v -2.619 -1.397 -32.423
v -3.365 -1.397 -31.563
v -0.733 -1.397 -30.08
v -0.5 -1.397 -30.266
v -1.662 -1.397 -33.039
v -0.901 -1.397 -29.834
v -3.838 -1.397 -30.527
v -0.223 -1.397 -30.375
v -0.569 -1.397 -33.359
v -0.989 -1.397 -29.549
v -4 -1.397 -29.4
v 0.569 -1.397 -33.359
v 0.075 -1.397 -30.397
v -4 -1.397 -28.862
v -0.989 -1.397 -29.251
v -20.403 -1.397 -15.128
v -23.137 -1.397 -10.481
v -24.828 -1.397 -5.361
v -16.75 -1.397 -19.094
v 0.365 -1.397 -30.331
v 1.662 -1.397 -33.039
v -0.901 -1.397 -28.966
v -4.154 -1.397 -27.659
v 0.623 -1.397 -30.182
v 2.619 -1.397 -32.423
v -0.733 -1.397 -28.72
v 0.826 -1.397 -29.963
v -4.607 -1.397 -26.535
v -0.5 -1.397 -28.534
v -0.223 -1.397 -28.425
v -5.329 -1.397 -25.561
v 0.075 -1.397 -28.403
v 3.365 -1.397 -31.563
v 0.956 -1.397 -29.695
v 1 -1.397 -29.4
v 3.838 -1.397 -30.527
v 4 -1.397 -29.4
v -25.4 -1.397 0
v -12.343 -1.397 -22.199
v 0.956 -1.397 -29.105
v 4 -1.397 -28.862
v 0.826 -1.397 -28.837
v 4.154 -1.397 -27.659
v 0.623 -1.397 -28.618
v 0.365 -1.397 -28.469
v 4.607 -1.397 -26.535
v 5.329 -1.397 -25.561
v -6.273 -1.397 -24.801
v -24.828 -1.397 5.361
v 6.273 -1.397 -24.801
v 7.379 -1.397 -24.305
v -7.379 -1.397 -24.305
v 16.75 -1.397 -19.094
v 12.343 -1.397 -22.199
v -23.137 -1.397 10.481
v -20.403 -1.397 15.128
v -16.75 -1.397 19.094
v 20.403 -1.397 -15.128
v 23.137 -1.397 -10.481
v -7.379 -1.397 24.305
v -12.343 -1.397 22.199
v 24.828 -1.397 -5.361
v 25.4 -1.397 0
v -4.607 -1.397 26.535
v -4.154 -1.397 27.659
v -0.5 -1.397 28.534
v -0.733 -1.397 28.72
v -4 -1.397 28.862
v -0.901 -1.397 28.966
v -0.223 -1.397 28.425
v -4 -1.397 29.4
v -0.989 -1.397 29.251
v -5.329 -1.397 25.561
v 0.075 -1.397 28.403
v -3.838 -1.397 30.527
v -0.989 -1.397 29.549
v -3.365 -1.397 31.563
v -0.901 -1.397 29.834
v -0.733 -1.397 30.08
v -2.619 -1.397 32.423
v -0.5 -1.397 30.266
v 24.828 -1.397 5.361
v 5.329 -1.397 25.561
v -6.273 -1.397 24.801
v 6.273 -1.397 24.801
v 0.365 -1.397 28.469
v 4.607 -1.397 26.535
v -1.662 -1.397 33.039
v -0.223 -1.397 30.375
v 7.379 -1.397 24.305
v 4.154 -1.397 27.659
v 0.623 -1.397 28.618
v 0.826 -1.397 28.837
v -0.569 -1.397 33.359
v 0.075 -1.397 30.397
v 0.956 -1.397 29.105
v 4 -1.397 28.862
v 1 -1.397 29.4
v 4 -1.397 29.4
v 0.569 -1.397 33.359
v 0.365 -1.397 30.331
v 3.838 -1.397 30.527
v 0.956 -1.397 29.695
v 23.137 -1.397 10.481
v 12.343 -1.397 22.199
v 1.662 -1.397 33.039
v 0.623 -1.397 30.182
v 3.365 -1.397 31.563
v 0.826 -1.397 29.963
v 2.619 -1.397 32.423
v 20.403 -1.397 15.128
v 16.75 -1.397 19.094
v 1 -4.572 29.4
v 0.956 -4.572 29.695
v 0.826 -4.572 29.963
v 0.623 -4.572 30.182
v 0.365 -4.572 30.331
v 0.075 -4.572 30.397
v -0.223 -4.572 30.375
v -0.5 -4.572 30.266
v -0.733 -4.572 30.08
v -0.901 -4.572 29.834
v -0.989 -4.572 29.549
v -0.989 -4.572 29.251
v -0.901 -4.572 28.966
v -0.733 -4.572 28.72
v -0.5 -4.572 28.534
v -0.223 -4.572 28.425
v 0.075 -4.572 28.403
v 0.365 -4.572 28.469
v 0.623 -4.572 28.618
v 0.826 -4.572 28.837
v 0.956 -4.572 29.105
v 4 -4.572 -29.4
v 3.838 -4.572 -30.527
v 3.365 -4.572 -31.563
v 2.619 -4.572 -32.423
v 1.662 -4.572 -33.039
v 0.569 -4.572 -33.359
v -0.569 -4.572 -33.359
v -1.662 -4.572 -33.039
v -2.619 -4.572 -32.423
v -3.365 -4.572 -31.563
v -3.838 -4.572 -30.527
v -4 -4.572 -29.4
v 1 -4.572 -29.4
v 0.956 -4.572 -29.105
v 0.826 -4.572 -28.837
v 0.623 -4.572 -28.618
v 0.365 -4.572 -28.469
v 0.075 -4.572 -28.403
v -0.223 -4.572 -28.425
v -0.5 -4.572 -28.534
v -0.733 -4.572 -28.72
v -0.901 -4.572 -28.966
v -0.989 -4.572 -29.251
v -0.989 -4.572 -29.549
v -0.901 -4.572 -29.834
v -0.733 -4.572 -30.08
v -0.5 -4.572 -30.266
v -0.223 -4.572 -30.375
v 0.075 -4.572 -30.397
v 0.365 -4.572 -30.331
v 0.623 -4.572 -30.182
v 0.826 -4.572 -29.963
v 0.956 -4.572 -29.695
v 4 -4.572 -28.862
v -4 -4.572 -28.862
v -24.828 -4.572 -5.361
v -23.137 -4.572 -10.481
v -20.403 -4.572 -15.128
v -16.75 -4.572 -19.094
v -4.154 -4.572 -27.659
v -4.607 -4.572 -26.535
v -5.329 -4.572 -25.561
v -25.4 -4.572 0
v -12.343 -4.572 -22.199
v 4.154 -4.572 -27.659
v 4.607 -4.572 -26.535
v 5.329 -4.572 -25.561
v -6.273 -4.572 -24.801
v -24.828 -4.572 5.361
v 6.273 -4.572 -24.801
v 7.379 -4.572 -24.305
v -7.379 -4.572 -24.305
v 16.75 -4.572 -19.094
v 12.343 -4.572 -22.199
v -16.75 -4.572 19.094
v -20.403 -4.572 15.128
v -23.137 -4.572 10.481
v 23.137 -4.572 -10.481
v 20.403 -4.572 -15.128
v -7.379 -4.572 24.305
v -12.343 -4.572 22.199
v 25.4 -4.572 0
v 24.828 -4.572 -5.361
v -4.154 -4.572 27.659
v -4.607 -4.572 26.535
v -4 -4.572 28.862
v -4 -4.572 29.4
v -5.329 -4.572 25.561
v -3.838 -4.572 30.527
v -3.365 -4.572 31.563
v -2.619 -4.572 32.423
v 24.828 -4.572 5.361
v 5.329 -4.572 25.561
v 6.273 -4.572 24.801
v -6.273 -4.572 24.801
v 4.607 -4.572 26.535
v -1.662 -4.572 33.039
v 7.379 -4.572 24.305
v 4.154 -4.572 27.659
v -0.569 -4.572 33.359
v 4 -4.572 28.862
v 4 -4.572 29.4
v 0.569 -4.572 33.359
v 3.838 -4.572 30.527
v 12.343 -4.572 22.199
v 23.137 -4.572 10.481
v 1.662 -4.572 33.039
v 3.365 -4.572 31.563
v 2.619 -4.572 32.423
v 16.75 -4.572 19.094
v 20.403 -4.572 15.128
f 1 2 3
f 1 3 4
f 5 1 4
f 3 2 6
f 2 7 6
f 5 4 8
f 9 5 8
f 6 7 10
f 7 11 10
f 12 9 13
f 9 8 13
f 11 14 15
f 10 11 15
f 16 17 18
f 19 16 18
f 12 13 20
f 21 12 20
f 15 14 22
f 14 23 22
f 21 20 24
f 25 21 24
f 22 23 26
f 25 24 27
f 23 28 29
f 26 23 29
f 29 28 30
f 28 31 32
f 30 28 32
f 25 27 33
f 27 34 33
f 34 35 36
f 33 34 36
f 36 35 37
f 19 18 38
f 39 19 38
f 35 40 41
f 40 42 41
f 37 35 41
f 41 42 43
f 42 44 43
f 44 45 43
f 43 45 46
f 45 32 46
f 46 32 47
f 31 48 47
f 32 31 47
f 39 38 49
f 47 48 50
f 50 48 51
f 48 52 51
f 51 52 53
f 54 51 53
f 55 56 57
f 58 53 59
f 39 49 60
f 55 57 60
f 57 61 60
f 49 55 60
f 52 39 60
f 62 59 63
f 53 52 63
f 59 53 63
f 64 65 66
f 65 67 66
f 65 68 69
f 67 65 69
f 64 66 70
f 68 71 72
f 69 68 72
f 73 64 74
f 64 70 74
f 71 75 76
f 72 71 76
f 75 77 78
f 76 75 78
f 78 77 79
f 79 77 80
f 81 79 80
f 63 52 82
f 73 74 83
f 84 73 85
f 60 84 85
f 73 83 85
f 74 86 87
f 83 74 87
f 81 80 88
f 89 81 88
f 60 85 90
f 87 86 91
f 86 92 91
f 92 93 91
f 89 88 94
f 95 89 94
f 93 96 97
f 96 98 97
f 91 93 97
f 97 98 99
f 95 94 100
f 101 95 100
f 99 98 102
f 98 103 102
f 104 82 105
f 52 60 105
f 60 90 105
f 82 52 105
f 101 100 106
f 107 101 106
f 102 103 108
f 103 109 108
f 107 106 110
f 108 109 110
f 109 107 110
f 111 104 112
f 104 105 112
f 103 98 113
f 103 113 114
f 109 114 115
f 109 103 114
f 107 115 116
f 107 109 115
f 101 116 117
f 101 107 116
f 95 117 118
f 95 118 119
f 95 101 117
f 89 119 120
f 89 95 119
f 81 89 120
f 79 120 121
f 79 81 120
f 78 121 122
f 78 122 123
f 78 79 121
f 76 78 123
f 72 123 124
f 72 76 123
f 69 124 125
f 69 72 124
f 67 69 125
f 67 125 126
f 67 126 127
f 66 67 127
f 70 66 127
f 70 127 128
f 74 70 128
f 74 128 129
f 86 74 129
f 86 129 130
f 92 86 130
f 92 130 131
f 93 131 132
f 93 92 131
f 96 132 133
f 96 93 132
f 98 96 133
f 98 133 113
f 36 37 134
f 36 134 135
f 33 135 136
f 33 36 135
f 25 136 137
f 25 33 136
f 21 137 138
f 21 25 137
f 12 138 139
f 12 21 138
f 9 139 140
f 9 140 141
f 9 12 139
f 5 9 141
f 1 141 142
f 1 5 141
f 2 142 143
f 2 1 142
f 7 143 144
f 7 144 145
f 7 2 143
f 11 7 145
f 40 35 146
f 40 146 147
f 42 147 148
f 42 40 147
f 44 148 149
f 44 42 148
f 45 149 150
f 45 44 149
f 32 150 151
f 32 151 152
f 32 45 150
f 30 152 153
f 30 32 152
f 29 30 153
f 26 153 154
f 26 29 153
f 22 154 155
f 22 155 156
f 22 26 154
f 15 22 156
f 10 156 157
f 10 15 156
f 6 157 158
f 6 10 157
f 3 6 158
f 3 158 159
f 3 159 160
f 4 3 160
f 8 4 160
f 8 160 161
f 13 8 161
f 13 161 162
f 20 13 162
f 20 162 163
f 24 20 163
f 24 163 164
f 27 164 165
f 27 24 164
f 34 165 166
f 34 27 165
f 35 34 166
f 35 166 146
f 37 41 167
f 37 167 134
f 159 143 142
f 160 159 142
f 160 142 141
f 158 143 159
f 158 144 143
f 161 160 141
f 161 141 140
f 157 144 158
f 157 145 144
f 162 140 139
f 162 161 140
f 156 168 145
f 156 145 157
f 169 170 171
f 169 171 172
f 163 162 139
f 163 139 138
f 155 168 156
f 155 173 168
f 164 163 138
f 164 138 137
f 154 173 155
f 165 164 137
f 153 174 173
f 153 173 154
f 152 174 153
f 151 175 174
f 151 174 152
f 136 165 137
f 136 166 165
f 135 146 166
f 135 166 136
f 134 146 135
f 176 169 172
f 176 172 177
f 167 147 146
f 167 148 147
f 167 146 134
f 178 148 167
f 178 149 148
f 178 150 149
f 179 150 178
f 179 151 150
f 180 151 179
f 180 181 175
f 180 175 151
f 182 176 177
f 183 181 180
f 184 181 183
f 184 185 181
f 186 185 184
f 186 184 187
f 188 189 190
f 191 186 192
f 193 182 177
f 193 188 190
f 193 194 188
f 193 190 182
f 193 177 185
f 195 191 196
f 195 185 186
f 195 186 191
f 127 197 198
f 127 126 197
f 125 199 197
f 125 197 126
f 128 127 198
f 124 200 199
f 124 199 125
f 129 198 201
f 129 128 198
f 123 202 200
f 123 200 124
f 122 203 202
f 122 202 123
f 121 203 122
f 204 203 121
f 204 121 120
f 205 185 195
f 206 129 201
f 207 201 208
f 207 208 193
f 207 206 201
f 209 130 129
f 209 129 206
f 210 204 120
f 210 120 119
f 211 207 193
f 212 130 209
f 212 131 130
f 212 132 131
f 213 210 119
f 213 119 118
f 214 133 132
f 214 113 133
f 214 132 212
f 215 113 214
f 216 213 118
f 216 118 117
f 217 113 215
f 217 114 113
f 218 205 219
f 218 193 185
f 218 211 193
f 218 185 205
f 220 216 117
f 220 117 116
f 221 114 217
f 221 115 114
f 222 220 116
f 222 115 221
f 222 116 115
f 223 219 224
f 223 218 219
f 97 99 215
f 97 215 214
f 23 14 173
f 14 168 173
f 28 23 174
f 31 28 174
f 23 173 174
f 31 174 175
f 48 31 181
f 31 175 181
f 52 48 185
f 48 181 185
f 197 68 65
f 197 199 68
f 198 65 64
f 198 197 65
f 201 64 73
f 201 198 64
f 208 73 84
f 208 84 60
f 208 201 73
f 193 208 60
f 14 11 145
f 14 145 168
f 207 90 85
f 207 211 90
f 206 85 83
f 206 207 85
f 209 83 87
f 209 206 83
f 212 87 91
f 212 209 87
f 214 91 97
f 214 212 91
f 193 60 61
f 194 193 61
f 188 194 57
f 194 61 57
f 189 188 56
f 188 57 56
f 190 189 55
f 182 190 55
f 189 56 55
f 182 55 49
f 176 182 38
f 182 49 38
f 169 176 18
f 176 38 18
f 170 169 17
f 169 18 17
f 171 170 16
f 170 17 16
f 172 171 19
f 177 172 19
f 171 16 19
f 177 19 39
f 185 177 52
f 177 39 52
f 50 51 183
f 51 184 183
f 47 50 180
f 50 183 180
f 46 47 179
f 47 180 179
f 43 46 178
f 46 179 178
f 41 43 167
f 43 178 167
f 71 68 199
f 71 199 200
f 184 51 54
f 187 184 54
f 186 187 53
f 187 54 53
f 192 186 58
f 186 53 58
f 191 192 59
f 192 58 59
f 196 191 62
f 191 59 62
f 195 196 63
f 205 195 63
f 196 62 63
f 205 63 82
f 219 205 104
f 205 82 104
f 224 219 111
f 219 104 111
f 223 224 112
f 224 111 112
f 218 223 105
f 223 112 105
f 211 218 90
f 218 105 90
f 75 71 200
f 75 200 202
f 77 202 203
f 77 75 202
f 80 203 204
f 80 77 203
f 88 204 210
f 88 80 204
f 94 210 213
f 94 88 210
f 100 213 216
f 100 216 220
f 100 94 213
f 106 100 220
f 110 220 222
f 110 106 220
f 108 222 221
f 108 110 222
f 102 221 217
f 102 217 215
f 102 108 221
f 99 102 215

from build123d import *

# Parameters (mm, degrees)
BOSS_EXTRUDE1_START = 1
SKETCH1_R           = 25.4
SKETCH1_R_2         = 1
BOSS_EXTRUDE1_DEPTH = 3.175
FILLET1_R           = 4.7625


with BuildPart() as part:
    # Sketch1 → Boss-Extrude1 (new body)
    with BuildSketch(Plane.XZ.offset(0.396875).offset(BOSS_EXTRUDE1_START)):
        Circle(SKETCH1_R)
        with BuildLine():
            Line((4, 29.4), (4, -29.4))
            ThreePointArc((4, -29.4), (0, -33.4), (-4, -29.4))
            Line((-4, -29.4), (-4, 29.4))
            ThreePointArc((-4, 29.4), (0, 33.4), (4, 29.4))
        make_face()
        with Locations((0, 29.4)):
            Circle(SKETCH1_R_2, mode=Mode.SUBTRACT)
        with Locations((0, -29.4)):
            Circle(SKETCH1_R_2, mode=Mode.SUBTRACT)
    extrude(amount=BOSS_EXTRUDE1_DEPTH)

    # Fillet1
    fillet1_edges = [part.edges().sort_by_distance(p)[0] for p in [
        (-4, -2.984375, -25.083062014),
        (-4, -2.984375, 25.083062014),
        (4, -2.984375, 25.083062014),
        (4, -2.984375, -25.083062014),
    ]]
    fillet(fillet1_edges, radius=FILLET1_R)


solid = part.part
